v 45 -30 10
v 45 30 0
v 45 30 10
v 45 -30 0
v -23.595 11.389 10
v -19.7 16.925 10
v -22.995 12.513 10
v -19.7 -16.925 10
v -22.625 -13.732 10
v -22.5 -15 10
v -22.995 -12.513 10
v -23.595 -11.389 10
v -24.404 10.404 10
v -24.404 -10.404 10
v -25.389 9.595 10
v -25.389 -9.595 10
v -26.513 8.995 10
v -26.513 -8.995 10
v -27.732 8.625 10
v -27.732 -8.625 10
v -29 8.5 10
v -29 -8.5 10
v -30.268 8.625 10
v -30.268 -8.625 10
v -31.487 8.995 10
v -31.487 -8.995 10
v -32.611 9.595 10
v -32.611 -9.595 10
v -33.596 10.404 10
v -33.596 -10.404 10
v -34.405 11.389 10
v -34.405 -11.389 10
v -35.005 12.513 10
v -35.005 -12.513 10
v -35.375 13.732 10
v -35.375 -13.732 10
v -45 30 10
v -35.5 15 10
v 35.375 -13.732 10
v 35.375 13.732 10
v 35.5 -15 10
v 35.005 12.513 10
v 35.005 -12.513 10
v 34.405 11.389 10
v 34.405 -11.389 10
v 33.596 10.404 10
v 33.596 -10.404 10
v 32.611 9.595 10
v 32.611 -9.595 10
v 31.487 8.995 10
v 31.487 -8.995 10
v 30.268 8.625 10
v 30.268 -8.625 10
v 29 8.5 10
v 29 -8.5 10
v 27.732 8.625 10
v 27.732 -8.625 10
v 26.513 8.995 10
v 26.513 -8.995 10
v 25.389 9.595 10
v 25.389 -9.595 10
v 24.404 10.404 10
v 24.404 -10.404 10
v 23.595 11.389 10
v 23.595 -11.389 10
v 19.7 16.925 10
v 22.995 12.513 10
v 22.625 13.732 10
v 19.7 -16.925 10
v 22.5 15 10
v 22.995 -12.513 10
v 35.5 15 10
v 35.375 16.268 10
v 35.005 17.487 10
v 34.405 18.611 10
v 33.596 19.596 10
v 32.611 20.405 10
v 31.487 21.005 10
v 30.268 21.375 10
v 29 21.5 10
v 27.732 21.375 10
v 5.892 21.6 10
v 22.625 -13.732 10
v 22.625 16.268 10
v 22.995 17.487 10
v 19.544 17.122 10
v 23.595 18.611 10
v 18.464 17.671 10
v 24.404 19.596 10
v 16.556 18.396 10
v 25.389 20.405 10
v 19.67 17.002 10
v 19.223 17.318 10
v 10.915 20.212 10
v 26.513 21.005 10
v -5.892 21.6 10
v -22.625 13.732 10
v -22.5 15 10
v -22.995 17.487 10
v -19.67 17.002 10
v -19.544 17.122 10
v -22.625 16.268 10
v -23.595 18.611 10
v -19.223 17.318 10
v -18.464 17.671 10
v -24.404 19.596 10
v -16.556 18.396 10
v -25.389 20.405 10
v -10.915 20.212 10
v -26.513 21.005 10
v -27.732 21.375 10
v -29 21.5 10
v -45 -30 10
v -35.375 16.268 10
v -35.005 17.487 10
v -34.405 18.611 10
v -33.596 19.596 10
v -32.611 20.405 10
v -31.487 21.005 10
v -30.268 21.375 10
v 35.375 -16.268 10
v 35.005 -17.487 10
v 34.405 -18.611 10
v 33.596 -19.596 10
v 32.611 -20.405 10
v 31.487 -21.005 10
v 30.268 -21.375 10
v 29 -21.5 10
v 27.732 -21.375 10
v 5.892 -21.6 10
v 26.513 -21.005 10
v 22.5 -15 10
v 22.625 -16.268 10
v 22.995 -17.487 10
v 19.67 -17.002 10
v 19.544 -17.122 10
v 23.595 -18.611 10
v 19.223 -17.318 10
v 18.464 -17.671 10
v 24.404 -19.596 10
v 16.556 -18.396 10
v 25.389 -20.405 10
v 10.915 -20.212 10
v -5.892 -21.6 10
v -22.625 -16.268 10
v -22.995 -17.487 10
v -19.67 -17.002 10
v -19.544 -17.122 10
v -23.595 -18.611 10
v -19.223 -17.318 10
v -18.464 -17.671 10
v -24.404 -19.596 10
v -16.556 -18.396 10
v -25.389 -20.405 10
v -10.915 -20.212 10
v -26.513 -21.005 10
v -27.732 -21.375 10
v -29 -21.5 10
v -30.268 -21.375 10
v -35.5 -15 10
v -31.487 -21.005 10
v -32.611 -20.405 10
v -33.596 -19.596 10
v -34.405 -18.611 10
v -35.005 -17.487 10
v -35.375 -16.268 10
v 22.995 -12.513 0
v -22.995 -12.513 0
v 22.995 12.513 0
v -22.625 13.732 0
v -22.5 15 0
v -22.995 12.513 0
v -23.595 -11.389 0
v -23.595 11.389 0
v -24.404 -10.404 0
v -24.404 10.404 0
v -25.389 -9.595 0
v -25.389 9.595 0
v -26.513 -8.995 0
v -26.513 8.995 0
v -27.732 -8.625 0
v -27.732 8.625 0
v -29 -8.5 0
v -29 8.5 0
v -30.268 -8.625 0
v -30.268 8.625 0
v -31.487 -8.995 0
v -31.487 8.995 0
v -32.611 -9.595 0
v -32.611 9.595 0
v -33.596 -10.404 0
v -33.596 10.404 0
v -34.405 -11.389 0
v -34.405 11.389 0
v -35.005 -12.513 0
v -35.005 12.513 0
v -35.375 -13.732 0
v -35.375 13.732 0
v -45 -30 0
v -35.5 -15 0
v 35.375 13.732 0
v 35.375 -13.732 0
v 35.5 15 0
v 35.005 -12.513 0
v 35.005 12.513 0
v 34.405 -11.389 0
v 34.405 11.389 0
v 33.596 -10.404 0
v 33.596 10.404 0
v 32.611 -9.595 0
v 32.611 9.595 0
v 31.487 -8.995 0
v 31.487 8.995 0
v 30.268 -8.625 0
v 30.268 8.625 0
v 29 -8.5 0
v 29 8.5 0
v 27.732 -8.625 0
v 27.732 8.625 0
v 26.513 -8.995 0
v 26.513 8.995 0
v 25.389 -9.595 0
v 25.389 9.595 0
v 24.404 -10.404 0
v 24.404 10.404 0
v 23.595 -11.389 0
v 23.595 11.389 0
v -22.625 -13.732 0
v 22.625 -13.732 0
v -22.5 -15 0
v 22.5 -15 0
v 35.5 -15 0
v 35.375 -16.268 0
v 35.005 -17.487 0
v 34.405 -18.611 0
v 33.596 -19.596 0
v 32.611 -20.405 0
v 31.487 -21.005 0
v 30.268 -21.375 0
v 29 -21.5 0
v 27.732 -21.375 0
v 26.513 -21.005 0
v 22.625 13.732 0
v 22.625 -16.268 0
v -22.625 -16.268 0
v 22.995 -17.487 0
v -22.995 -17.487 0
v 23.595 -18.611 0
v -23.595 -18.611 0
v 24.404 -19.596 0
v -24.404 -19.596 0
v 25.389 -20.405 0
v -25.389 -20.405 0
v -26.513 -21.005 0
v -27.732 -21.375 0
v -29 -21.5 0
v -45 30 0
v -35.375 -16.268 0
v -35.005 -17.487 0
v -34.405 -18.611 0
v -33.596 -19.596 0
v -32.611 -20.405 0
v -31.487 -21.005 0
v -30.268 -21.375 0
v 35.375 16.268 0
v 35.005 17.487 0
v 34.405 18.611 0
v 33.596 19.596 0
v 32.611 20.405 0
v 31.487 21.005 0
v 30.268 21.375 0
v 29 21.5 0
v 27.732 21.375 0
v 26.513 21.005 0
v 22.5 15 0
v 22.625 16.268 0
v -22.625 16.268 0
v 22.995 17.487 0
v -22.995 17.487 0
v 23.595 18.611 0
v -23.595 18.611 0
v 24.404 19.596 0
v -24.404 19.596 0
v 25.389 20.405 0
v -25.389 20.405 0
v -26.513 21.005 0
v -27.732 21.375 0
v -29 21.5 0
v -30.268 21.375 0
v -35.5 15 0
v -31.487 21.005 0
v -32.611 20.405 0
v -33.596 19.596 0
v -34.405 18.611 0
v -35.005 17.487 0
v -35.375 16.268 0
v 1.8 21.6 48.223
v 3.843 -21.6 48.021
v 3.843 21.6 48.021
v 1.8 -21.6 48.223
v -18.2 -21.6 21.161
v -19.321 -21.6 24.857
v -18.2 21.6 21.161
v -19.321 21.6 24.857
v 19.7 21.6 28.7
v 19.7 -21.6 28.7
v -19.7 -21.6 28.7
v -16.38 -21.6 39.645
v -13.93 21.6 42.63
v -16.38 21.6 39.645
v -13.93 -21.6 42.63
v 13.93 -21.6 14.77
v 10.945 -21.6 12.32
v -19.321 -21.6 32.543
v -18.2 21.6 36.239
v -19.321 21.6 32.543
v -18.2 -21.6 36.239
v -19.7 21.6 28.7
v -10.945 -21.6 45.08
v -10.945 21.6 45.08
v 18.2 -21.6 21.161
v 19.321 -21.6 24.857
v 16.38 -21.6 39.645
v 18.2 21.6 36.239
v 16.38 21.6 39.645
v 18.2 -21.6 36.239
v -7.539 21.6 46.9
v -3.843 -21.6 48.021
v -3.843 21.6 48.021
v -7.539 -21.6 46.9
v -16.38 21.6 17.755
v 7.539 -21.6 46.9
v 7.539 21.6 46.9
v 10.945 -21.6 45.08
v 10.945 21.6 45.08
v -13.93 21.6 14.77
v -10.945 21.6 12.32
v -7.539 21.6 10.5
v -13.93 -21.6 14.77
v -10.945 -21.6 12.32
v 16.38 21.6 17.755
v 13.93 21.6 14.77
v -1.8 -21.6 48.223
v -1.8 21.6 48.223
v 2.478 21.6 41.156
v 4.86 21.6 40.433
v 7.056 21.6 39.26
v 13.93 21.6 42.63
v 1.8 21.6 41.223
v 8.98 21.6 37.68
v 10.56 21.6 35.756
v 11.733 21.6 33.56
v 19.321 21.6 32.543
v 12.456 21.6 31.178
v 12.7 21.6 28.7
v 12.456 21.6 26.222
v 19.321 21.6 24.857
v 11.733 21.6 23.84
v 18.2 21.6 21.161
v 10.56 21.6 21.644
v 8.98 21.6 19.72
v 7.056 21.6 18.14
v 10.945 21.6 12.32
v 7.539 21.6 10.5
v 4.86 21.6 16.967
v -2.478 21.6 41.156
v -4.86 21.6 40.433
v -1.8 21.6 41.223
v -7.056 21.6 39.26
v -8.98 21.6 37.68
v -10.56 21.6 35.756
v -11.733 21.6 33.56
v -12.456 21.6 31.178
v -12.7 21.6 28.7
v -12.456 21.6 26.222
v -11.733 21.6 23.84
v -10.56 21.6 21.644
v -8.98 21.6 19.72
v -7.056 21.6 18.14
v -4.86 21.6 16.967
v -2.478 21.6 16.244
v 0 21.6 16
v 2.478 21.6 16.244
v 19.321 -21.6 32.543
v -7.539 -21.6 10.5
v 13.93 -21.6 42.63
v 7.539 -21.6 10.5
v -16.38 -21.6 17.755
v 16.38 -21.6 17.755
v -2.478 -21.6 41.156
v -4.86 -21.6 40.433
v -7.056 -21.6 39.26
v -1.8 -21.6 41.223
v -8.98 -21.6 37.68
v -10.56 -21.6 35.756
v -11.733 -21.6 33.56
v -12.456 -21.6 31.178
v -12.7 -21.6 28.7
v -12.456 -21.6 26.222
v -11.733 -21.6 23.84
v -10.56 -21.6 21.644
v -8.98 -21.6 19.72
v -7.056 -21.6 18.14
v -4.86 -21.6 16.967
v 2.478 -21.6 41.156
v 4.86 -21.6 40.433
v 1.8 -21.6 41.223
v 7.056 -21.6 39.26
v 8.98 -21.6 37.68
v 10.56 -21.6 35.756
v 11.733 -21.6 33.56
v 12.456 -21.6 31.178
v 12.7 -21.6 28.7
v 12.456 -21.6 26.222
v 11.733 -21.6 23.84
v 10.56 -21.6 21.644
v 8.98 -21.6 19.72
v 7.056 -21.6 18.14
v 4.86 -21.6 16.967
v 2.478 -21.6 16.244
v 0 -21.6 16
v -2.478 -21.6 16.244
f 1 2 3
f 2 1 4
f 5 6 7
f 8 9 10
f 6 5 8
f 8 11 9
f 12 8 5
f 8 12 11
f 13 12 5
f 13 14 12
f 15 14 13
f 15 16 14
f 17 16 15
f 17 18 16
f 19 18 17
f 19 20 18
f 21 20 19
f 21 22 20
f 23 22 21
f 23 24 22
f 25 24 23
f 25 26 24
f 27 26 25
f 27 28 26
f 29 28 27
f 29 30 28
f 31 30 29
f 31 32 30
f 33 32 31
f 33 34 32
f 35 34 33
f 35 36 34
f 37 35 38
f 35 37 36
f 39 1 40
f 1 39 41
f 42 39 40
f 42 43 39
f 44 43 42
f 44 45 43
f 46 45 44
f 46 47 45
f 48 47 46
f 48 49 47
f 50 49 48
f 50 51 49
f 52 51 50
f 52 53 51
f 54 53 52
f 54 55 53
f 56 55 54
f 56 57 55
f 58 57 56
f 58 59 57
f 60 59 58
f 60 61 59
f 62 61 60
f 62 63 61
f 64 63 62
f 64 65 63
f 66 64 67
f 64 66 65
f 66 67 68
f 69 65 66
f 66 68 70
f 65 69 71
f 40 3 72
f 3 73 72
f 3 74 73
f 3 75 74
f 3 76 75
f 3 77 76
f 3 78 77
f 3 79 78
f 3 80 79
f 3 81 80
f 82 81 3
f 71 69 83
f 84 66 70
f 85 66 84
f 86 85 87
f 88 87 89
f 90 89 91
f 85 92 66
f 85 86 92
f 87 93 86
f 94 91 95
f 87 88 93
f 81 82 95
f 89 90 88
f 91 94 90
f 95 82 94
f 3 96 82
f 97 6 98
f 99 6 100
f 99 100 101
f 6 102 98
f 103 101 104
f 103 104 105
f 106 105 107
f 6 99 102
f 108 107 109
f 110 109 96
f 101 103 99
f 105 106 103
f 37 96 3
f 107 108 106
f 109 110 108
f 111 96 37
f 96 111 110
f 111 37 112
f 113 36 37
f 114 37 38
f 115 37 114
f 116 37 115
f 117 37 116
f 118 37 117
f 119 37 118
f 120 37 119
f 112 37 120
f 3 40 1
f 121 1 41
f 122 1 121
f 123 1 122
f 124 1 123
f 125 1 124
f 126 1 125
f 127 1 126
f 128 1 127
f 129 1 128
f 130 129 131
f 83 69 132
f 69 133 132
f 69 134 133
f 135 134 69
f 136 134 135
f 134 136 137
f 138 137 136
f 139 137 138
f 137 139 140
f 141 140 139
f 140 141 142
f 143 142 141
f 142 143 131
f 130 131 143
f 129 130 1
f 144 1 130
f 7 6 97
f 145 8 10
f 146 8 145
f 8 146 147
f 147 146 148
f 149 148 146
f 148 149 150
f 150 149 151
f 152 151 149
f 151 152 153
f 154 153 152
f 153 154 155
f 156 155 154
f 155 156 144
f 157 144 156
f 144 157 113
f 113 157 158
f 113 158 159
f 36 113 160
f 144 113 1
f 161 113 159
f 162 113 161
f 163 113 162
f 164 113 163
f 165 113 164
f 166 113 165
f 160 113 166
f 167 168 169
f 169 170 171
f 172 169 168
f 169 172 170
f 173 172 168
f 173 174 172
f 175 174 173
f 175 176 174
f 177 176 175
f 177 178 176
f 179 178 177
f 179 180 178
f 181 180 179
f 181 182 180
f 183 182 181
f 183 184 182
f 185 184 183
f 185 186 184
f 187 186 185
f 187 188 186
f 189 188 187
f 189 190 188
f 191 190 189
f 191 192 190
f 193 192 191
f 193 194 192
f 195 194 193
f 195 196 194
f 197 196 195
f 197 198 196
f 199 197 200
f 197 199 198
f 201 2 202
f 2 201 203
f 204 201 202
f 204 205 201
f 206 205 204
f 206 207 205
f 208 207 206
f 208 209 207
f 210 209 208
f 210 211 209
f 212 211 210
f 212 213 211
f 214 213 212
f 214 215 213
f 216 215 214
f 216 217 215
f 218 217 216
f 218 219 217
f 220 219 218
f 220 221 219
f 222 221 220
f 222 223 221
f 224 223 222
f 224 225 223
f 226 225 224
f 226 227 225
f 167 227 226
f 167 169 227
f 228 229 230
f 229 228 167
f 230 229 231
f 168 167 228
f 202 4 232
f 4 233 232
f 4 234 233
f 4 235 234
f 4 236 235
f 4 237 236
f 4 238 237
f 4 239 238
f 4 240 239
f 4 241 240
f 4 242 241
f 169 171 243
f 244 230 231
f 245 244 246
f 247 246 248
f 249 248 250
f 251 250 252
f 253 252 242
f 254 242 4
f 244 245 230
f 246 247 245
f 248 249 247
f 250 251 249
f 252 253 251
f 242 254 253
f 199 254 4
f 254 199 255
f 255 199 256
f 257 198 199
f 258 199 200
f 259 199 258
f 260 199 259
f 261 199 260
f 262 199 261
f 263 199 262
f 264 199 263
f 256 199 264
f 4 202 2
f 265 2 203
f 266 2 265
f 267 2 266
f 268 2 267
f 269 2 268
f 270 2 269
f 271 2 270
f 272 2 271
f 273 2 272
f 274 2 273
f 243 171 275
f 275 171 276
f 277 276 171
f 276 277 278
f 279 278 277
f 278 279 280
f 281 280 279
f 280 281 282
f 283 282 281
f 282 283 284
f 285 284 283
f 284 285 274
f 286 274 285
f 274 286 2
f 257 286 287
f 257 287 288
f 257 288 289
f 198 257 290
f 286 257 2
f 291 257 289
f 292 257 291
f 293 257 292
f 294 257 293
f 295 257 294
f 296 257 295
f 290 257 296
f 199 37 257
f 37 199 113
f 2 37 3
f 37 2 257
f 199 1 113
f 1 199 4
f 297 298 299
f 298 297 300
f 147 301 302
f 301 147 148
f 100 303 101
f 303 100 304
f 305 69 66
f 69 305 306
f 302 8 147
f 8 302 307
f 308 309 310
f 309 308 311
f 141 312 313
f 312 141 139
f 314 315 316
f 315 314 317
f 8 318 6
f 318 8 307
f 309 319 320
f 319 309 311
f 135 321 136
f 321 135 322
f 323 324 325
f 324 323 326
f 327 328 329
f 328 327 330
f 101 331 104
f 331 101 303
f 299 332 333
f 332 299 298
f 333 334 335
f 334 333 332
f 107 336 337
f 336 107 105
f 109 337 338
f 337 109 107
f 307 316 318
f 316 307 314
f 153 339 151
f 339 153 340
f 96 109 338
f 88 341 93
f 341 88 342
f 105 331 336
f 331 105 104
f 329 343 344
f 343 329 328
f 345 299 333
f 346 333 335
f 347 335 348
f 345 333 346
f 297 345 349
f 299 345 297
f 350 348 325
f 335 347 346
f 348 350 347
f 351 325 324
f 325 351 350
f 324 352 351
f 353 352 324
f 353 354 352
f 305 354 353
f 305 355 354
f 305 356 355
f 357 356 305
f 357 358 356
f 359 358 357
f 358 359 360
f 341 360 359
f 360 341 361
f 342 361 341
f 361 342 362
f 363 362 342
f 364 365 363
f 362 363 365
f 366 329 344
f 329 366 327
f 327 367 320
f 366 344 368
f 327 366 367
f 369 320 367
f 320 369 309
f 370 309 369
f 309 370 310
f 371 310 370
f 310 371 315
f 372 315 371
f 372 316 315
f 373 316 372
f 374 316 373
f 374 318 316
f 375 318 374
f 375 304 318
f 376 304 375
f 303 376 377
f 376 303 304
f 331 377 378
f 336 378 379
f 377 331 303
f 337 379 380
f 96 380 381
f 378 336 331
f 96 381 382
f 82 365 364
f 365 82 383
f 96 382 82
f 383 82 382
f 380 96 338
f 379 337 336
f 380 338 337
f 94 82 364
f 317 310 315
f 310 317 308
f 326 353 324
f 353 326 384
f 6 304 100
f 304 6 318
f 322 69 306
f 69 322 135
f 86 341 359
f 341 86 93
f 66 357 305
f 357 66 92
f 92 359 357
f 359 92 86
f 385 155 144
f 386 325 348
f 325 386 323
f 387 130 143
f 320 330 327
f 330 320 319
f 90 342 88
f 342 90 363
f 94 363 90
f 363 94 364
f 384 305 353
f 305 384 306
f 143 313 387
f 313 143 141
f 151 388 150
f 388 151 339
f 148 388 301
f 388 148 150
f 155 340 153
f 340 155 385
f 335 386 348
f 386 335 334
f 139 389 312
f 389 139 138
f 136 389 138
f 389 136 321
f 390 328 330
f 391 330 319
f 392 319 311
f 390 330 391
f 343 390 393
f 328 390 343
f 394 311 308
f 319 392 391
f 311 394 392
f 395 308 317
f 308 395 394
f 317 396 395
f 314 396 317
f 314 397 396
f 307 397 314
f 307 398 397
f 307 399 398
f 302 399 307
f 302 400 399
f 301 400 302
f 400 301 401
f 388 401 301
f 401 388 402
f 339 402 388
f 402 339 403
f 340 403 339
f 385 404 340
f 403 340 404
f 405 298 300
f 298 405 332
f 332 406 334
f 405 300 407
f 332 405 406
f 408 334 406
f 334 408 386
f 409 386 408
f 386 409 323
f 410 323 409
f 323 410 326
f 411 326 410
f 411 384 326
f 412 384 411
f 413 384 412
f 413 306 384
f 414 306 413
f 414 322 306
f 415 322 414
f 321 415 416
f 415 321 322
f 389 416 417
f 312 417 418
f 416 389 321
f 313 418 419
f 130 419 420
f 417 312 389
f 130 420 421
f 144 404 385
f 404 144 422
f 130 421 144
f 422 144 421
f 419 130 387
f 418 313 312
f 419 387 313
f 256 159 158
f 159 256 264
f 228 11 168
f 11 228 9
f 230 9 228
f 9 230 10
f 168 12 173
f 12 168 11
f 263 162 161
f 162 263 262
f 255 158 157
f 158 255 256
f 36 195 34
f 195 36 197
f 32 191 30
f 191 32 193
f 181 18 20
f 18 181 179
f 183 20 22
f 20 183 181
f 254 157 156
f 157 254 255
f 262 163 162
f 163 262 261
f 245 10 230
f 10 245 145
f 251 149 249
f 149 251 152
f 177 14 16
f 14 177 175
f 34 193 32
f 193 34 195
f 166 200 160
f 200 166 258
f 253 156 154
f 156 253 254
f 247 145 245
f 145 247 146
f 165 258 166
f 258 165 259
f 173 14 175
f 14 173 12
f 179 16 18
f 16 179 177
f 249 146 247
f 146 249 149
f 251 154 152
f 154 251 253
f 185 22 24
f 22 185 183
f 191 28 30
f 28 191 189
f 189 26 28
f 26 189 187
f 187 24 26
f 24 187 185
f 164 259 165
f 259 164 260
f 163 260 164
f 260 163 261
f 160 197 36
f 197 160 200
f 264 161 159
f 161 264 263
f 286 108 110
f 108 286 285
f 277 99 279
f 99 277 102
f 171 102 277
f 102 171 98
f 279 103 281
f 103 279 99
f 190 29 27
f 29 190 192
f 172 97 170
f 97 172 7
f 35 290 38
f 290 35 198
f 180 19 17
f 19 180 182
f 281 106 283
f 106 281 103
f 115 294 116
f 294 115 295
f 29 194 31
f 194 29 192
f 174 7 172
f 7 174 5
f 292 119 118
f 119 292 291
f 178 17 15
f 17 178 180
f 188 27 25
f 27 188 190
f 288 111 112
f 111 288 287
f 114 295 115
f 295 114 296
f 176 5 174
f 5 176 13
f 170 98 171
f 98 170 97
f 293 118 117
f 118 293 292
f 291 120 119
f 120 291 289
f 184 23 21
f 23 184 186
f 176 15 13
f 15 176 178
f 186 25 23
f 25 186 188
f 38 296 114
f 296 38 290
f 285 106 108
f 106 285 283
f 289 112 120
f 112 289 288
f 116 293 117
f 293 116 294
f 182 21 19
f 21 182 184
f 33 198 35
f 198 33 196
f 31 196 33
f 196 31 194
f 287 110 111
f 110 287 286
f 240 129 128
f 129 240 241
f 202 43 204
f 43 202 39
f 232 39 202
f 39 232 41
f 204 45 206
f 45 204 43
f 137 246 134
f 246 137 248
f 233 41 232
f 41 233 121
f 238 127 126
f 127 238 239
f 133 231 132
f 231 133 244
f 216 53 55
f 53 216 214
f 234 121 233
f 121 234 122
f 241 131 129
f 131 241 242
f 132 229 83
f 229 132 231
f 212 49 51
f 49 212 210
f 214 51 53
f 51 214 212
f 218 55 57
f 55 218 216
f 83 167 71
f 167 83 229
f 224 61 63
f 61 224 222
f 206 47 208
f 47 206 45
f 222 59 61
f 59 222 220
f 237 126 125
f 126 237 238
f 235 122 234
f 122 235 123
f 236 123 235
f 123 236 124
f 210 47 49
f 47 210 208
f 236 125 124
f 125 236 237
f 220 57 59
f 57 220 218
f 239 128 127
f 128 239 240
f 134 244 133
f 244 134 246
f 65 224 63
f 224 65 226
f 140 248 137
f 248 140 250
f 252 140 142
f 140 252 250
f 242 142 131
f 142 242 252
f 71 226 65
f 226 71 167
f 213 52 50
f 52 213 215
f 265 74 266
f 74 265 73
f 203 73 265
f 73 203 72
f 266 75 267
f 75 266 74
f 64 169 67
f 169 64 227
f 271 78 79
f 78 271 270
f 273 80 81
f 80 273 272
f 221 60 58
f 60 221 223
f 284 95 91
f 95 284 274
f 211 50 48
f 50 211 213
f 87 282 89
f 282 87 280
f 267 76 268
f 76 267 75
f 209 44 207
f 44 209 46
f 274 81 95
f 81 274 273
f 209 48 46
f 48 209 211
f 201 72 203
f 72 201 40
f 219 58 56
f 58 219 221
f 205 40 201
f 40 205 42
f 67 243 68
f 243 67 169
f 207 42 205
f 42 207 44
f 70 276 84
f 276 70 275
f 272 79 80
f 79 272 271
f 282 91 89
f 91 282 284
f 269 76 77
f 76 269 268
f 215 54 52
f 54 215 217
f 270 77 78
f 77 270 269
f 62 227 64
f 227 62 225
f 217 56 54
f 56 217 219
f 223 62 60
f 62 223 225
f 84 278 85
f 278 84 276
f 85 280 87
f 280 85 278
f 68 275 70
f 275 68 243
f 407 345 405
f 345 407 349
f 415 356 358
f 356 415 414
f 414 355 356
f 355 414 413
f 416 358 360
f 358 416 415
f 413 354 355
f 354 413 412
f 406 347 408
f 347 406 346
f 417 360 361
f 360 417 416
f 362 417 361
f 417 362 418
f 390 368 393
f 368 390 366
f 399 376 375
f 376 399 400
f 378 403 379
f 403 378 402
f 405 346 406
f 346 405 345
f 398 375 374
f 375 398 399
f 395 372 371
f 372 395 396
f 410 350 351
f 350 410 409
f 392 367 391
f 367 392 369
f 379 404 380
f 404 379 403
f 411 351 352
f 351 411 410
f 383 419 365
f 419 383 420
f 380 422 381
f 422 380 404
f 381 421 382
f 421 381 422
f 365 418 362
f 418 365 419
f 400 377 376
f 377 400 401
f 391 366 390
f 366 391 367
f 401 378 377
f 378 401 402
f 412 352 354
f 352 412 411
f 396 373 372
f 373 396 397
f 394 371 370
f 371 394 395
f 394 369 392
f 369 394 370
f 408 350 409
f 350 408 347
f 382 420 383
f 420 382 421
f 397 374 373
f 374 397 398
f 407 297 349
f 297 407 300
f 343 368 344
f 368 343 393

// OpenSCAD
$fn = 32;

// ----------------------------------------------------------------------
// Bearing block: 90 x 60 mm base, 25.4 mm bore at 28.7 mm
// ----------------------------------------------------------------------

// --- parameters (mm) ---
base_w = 90;              // base width
base_d = 60;              // base depth
base_t = 10;              // base thickness
bore_d = 25.4;            // shaft / bearing bore
house_r = 19.7;           // housing outer radius
house_len = 43.2;         // housing length along the shaft
foot_w = 39.4;            // foot width under the housing
foot_len = 33.2;          // foot length along the shaft
axis_z = 28.7;            // bore axis height above the base
holes_d = 13;             // mounting holes
hole_x = 29;              // mounting hole spacing
groove_w = 3.6;           // oil groove width

difference() {
  union() {
    /* base plate with its underside on z = 0 */
    translate([0, 0, base_t / 2]) cube([base_w, base_d, base_t], center = true);
    /* hull foot: a straight web blending into the round housing */
    hull() {
      translate([0, 0, base_t - 0.5]) cube([foot_w, foot_len, 1.6], center = true);
      translate([0, 0, axis_z]) rotate([-90, 0, 0]) cylinder(h = house_len, d = 2 * house_r, center = true);
    }
  }
  /* bore through the housing, 2.5 mm clear on both sides */
  translate([0, 0, axis_z]) rotate([-90, 0, 0]) cylinder(h = house_len + 5, d = bore_d, center = true);
  /* oil groove from the top of the housing into the bore */
  translate([-groove_w / 2, -house_len / 2 - 2.5, axis_z + bore_d * 0.17]) cube([groove_w, house_len + 5, house_r + 5]);
  /* mounting holes through the base plate */
  for (hx = [-29, 29]) {
    for (hy = [-15, 15]) {
      translate([hx, hy, -2.5]) cylinder(h = base_t + 5, d = holes_d);
    }
  }
}
